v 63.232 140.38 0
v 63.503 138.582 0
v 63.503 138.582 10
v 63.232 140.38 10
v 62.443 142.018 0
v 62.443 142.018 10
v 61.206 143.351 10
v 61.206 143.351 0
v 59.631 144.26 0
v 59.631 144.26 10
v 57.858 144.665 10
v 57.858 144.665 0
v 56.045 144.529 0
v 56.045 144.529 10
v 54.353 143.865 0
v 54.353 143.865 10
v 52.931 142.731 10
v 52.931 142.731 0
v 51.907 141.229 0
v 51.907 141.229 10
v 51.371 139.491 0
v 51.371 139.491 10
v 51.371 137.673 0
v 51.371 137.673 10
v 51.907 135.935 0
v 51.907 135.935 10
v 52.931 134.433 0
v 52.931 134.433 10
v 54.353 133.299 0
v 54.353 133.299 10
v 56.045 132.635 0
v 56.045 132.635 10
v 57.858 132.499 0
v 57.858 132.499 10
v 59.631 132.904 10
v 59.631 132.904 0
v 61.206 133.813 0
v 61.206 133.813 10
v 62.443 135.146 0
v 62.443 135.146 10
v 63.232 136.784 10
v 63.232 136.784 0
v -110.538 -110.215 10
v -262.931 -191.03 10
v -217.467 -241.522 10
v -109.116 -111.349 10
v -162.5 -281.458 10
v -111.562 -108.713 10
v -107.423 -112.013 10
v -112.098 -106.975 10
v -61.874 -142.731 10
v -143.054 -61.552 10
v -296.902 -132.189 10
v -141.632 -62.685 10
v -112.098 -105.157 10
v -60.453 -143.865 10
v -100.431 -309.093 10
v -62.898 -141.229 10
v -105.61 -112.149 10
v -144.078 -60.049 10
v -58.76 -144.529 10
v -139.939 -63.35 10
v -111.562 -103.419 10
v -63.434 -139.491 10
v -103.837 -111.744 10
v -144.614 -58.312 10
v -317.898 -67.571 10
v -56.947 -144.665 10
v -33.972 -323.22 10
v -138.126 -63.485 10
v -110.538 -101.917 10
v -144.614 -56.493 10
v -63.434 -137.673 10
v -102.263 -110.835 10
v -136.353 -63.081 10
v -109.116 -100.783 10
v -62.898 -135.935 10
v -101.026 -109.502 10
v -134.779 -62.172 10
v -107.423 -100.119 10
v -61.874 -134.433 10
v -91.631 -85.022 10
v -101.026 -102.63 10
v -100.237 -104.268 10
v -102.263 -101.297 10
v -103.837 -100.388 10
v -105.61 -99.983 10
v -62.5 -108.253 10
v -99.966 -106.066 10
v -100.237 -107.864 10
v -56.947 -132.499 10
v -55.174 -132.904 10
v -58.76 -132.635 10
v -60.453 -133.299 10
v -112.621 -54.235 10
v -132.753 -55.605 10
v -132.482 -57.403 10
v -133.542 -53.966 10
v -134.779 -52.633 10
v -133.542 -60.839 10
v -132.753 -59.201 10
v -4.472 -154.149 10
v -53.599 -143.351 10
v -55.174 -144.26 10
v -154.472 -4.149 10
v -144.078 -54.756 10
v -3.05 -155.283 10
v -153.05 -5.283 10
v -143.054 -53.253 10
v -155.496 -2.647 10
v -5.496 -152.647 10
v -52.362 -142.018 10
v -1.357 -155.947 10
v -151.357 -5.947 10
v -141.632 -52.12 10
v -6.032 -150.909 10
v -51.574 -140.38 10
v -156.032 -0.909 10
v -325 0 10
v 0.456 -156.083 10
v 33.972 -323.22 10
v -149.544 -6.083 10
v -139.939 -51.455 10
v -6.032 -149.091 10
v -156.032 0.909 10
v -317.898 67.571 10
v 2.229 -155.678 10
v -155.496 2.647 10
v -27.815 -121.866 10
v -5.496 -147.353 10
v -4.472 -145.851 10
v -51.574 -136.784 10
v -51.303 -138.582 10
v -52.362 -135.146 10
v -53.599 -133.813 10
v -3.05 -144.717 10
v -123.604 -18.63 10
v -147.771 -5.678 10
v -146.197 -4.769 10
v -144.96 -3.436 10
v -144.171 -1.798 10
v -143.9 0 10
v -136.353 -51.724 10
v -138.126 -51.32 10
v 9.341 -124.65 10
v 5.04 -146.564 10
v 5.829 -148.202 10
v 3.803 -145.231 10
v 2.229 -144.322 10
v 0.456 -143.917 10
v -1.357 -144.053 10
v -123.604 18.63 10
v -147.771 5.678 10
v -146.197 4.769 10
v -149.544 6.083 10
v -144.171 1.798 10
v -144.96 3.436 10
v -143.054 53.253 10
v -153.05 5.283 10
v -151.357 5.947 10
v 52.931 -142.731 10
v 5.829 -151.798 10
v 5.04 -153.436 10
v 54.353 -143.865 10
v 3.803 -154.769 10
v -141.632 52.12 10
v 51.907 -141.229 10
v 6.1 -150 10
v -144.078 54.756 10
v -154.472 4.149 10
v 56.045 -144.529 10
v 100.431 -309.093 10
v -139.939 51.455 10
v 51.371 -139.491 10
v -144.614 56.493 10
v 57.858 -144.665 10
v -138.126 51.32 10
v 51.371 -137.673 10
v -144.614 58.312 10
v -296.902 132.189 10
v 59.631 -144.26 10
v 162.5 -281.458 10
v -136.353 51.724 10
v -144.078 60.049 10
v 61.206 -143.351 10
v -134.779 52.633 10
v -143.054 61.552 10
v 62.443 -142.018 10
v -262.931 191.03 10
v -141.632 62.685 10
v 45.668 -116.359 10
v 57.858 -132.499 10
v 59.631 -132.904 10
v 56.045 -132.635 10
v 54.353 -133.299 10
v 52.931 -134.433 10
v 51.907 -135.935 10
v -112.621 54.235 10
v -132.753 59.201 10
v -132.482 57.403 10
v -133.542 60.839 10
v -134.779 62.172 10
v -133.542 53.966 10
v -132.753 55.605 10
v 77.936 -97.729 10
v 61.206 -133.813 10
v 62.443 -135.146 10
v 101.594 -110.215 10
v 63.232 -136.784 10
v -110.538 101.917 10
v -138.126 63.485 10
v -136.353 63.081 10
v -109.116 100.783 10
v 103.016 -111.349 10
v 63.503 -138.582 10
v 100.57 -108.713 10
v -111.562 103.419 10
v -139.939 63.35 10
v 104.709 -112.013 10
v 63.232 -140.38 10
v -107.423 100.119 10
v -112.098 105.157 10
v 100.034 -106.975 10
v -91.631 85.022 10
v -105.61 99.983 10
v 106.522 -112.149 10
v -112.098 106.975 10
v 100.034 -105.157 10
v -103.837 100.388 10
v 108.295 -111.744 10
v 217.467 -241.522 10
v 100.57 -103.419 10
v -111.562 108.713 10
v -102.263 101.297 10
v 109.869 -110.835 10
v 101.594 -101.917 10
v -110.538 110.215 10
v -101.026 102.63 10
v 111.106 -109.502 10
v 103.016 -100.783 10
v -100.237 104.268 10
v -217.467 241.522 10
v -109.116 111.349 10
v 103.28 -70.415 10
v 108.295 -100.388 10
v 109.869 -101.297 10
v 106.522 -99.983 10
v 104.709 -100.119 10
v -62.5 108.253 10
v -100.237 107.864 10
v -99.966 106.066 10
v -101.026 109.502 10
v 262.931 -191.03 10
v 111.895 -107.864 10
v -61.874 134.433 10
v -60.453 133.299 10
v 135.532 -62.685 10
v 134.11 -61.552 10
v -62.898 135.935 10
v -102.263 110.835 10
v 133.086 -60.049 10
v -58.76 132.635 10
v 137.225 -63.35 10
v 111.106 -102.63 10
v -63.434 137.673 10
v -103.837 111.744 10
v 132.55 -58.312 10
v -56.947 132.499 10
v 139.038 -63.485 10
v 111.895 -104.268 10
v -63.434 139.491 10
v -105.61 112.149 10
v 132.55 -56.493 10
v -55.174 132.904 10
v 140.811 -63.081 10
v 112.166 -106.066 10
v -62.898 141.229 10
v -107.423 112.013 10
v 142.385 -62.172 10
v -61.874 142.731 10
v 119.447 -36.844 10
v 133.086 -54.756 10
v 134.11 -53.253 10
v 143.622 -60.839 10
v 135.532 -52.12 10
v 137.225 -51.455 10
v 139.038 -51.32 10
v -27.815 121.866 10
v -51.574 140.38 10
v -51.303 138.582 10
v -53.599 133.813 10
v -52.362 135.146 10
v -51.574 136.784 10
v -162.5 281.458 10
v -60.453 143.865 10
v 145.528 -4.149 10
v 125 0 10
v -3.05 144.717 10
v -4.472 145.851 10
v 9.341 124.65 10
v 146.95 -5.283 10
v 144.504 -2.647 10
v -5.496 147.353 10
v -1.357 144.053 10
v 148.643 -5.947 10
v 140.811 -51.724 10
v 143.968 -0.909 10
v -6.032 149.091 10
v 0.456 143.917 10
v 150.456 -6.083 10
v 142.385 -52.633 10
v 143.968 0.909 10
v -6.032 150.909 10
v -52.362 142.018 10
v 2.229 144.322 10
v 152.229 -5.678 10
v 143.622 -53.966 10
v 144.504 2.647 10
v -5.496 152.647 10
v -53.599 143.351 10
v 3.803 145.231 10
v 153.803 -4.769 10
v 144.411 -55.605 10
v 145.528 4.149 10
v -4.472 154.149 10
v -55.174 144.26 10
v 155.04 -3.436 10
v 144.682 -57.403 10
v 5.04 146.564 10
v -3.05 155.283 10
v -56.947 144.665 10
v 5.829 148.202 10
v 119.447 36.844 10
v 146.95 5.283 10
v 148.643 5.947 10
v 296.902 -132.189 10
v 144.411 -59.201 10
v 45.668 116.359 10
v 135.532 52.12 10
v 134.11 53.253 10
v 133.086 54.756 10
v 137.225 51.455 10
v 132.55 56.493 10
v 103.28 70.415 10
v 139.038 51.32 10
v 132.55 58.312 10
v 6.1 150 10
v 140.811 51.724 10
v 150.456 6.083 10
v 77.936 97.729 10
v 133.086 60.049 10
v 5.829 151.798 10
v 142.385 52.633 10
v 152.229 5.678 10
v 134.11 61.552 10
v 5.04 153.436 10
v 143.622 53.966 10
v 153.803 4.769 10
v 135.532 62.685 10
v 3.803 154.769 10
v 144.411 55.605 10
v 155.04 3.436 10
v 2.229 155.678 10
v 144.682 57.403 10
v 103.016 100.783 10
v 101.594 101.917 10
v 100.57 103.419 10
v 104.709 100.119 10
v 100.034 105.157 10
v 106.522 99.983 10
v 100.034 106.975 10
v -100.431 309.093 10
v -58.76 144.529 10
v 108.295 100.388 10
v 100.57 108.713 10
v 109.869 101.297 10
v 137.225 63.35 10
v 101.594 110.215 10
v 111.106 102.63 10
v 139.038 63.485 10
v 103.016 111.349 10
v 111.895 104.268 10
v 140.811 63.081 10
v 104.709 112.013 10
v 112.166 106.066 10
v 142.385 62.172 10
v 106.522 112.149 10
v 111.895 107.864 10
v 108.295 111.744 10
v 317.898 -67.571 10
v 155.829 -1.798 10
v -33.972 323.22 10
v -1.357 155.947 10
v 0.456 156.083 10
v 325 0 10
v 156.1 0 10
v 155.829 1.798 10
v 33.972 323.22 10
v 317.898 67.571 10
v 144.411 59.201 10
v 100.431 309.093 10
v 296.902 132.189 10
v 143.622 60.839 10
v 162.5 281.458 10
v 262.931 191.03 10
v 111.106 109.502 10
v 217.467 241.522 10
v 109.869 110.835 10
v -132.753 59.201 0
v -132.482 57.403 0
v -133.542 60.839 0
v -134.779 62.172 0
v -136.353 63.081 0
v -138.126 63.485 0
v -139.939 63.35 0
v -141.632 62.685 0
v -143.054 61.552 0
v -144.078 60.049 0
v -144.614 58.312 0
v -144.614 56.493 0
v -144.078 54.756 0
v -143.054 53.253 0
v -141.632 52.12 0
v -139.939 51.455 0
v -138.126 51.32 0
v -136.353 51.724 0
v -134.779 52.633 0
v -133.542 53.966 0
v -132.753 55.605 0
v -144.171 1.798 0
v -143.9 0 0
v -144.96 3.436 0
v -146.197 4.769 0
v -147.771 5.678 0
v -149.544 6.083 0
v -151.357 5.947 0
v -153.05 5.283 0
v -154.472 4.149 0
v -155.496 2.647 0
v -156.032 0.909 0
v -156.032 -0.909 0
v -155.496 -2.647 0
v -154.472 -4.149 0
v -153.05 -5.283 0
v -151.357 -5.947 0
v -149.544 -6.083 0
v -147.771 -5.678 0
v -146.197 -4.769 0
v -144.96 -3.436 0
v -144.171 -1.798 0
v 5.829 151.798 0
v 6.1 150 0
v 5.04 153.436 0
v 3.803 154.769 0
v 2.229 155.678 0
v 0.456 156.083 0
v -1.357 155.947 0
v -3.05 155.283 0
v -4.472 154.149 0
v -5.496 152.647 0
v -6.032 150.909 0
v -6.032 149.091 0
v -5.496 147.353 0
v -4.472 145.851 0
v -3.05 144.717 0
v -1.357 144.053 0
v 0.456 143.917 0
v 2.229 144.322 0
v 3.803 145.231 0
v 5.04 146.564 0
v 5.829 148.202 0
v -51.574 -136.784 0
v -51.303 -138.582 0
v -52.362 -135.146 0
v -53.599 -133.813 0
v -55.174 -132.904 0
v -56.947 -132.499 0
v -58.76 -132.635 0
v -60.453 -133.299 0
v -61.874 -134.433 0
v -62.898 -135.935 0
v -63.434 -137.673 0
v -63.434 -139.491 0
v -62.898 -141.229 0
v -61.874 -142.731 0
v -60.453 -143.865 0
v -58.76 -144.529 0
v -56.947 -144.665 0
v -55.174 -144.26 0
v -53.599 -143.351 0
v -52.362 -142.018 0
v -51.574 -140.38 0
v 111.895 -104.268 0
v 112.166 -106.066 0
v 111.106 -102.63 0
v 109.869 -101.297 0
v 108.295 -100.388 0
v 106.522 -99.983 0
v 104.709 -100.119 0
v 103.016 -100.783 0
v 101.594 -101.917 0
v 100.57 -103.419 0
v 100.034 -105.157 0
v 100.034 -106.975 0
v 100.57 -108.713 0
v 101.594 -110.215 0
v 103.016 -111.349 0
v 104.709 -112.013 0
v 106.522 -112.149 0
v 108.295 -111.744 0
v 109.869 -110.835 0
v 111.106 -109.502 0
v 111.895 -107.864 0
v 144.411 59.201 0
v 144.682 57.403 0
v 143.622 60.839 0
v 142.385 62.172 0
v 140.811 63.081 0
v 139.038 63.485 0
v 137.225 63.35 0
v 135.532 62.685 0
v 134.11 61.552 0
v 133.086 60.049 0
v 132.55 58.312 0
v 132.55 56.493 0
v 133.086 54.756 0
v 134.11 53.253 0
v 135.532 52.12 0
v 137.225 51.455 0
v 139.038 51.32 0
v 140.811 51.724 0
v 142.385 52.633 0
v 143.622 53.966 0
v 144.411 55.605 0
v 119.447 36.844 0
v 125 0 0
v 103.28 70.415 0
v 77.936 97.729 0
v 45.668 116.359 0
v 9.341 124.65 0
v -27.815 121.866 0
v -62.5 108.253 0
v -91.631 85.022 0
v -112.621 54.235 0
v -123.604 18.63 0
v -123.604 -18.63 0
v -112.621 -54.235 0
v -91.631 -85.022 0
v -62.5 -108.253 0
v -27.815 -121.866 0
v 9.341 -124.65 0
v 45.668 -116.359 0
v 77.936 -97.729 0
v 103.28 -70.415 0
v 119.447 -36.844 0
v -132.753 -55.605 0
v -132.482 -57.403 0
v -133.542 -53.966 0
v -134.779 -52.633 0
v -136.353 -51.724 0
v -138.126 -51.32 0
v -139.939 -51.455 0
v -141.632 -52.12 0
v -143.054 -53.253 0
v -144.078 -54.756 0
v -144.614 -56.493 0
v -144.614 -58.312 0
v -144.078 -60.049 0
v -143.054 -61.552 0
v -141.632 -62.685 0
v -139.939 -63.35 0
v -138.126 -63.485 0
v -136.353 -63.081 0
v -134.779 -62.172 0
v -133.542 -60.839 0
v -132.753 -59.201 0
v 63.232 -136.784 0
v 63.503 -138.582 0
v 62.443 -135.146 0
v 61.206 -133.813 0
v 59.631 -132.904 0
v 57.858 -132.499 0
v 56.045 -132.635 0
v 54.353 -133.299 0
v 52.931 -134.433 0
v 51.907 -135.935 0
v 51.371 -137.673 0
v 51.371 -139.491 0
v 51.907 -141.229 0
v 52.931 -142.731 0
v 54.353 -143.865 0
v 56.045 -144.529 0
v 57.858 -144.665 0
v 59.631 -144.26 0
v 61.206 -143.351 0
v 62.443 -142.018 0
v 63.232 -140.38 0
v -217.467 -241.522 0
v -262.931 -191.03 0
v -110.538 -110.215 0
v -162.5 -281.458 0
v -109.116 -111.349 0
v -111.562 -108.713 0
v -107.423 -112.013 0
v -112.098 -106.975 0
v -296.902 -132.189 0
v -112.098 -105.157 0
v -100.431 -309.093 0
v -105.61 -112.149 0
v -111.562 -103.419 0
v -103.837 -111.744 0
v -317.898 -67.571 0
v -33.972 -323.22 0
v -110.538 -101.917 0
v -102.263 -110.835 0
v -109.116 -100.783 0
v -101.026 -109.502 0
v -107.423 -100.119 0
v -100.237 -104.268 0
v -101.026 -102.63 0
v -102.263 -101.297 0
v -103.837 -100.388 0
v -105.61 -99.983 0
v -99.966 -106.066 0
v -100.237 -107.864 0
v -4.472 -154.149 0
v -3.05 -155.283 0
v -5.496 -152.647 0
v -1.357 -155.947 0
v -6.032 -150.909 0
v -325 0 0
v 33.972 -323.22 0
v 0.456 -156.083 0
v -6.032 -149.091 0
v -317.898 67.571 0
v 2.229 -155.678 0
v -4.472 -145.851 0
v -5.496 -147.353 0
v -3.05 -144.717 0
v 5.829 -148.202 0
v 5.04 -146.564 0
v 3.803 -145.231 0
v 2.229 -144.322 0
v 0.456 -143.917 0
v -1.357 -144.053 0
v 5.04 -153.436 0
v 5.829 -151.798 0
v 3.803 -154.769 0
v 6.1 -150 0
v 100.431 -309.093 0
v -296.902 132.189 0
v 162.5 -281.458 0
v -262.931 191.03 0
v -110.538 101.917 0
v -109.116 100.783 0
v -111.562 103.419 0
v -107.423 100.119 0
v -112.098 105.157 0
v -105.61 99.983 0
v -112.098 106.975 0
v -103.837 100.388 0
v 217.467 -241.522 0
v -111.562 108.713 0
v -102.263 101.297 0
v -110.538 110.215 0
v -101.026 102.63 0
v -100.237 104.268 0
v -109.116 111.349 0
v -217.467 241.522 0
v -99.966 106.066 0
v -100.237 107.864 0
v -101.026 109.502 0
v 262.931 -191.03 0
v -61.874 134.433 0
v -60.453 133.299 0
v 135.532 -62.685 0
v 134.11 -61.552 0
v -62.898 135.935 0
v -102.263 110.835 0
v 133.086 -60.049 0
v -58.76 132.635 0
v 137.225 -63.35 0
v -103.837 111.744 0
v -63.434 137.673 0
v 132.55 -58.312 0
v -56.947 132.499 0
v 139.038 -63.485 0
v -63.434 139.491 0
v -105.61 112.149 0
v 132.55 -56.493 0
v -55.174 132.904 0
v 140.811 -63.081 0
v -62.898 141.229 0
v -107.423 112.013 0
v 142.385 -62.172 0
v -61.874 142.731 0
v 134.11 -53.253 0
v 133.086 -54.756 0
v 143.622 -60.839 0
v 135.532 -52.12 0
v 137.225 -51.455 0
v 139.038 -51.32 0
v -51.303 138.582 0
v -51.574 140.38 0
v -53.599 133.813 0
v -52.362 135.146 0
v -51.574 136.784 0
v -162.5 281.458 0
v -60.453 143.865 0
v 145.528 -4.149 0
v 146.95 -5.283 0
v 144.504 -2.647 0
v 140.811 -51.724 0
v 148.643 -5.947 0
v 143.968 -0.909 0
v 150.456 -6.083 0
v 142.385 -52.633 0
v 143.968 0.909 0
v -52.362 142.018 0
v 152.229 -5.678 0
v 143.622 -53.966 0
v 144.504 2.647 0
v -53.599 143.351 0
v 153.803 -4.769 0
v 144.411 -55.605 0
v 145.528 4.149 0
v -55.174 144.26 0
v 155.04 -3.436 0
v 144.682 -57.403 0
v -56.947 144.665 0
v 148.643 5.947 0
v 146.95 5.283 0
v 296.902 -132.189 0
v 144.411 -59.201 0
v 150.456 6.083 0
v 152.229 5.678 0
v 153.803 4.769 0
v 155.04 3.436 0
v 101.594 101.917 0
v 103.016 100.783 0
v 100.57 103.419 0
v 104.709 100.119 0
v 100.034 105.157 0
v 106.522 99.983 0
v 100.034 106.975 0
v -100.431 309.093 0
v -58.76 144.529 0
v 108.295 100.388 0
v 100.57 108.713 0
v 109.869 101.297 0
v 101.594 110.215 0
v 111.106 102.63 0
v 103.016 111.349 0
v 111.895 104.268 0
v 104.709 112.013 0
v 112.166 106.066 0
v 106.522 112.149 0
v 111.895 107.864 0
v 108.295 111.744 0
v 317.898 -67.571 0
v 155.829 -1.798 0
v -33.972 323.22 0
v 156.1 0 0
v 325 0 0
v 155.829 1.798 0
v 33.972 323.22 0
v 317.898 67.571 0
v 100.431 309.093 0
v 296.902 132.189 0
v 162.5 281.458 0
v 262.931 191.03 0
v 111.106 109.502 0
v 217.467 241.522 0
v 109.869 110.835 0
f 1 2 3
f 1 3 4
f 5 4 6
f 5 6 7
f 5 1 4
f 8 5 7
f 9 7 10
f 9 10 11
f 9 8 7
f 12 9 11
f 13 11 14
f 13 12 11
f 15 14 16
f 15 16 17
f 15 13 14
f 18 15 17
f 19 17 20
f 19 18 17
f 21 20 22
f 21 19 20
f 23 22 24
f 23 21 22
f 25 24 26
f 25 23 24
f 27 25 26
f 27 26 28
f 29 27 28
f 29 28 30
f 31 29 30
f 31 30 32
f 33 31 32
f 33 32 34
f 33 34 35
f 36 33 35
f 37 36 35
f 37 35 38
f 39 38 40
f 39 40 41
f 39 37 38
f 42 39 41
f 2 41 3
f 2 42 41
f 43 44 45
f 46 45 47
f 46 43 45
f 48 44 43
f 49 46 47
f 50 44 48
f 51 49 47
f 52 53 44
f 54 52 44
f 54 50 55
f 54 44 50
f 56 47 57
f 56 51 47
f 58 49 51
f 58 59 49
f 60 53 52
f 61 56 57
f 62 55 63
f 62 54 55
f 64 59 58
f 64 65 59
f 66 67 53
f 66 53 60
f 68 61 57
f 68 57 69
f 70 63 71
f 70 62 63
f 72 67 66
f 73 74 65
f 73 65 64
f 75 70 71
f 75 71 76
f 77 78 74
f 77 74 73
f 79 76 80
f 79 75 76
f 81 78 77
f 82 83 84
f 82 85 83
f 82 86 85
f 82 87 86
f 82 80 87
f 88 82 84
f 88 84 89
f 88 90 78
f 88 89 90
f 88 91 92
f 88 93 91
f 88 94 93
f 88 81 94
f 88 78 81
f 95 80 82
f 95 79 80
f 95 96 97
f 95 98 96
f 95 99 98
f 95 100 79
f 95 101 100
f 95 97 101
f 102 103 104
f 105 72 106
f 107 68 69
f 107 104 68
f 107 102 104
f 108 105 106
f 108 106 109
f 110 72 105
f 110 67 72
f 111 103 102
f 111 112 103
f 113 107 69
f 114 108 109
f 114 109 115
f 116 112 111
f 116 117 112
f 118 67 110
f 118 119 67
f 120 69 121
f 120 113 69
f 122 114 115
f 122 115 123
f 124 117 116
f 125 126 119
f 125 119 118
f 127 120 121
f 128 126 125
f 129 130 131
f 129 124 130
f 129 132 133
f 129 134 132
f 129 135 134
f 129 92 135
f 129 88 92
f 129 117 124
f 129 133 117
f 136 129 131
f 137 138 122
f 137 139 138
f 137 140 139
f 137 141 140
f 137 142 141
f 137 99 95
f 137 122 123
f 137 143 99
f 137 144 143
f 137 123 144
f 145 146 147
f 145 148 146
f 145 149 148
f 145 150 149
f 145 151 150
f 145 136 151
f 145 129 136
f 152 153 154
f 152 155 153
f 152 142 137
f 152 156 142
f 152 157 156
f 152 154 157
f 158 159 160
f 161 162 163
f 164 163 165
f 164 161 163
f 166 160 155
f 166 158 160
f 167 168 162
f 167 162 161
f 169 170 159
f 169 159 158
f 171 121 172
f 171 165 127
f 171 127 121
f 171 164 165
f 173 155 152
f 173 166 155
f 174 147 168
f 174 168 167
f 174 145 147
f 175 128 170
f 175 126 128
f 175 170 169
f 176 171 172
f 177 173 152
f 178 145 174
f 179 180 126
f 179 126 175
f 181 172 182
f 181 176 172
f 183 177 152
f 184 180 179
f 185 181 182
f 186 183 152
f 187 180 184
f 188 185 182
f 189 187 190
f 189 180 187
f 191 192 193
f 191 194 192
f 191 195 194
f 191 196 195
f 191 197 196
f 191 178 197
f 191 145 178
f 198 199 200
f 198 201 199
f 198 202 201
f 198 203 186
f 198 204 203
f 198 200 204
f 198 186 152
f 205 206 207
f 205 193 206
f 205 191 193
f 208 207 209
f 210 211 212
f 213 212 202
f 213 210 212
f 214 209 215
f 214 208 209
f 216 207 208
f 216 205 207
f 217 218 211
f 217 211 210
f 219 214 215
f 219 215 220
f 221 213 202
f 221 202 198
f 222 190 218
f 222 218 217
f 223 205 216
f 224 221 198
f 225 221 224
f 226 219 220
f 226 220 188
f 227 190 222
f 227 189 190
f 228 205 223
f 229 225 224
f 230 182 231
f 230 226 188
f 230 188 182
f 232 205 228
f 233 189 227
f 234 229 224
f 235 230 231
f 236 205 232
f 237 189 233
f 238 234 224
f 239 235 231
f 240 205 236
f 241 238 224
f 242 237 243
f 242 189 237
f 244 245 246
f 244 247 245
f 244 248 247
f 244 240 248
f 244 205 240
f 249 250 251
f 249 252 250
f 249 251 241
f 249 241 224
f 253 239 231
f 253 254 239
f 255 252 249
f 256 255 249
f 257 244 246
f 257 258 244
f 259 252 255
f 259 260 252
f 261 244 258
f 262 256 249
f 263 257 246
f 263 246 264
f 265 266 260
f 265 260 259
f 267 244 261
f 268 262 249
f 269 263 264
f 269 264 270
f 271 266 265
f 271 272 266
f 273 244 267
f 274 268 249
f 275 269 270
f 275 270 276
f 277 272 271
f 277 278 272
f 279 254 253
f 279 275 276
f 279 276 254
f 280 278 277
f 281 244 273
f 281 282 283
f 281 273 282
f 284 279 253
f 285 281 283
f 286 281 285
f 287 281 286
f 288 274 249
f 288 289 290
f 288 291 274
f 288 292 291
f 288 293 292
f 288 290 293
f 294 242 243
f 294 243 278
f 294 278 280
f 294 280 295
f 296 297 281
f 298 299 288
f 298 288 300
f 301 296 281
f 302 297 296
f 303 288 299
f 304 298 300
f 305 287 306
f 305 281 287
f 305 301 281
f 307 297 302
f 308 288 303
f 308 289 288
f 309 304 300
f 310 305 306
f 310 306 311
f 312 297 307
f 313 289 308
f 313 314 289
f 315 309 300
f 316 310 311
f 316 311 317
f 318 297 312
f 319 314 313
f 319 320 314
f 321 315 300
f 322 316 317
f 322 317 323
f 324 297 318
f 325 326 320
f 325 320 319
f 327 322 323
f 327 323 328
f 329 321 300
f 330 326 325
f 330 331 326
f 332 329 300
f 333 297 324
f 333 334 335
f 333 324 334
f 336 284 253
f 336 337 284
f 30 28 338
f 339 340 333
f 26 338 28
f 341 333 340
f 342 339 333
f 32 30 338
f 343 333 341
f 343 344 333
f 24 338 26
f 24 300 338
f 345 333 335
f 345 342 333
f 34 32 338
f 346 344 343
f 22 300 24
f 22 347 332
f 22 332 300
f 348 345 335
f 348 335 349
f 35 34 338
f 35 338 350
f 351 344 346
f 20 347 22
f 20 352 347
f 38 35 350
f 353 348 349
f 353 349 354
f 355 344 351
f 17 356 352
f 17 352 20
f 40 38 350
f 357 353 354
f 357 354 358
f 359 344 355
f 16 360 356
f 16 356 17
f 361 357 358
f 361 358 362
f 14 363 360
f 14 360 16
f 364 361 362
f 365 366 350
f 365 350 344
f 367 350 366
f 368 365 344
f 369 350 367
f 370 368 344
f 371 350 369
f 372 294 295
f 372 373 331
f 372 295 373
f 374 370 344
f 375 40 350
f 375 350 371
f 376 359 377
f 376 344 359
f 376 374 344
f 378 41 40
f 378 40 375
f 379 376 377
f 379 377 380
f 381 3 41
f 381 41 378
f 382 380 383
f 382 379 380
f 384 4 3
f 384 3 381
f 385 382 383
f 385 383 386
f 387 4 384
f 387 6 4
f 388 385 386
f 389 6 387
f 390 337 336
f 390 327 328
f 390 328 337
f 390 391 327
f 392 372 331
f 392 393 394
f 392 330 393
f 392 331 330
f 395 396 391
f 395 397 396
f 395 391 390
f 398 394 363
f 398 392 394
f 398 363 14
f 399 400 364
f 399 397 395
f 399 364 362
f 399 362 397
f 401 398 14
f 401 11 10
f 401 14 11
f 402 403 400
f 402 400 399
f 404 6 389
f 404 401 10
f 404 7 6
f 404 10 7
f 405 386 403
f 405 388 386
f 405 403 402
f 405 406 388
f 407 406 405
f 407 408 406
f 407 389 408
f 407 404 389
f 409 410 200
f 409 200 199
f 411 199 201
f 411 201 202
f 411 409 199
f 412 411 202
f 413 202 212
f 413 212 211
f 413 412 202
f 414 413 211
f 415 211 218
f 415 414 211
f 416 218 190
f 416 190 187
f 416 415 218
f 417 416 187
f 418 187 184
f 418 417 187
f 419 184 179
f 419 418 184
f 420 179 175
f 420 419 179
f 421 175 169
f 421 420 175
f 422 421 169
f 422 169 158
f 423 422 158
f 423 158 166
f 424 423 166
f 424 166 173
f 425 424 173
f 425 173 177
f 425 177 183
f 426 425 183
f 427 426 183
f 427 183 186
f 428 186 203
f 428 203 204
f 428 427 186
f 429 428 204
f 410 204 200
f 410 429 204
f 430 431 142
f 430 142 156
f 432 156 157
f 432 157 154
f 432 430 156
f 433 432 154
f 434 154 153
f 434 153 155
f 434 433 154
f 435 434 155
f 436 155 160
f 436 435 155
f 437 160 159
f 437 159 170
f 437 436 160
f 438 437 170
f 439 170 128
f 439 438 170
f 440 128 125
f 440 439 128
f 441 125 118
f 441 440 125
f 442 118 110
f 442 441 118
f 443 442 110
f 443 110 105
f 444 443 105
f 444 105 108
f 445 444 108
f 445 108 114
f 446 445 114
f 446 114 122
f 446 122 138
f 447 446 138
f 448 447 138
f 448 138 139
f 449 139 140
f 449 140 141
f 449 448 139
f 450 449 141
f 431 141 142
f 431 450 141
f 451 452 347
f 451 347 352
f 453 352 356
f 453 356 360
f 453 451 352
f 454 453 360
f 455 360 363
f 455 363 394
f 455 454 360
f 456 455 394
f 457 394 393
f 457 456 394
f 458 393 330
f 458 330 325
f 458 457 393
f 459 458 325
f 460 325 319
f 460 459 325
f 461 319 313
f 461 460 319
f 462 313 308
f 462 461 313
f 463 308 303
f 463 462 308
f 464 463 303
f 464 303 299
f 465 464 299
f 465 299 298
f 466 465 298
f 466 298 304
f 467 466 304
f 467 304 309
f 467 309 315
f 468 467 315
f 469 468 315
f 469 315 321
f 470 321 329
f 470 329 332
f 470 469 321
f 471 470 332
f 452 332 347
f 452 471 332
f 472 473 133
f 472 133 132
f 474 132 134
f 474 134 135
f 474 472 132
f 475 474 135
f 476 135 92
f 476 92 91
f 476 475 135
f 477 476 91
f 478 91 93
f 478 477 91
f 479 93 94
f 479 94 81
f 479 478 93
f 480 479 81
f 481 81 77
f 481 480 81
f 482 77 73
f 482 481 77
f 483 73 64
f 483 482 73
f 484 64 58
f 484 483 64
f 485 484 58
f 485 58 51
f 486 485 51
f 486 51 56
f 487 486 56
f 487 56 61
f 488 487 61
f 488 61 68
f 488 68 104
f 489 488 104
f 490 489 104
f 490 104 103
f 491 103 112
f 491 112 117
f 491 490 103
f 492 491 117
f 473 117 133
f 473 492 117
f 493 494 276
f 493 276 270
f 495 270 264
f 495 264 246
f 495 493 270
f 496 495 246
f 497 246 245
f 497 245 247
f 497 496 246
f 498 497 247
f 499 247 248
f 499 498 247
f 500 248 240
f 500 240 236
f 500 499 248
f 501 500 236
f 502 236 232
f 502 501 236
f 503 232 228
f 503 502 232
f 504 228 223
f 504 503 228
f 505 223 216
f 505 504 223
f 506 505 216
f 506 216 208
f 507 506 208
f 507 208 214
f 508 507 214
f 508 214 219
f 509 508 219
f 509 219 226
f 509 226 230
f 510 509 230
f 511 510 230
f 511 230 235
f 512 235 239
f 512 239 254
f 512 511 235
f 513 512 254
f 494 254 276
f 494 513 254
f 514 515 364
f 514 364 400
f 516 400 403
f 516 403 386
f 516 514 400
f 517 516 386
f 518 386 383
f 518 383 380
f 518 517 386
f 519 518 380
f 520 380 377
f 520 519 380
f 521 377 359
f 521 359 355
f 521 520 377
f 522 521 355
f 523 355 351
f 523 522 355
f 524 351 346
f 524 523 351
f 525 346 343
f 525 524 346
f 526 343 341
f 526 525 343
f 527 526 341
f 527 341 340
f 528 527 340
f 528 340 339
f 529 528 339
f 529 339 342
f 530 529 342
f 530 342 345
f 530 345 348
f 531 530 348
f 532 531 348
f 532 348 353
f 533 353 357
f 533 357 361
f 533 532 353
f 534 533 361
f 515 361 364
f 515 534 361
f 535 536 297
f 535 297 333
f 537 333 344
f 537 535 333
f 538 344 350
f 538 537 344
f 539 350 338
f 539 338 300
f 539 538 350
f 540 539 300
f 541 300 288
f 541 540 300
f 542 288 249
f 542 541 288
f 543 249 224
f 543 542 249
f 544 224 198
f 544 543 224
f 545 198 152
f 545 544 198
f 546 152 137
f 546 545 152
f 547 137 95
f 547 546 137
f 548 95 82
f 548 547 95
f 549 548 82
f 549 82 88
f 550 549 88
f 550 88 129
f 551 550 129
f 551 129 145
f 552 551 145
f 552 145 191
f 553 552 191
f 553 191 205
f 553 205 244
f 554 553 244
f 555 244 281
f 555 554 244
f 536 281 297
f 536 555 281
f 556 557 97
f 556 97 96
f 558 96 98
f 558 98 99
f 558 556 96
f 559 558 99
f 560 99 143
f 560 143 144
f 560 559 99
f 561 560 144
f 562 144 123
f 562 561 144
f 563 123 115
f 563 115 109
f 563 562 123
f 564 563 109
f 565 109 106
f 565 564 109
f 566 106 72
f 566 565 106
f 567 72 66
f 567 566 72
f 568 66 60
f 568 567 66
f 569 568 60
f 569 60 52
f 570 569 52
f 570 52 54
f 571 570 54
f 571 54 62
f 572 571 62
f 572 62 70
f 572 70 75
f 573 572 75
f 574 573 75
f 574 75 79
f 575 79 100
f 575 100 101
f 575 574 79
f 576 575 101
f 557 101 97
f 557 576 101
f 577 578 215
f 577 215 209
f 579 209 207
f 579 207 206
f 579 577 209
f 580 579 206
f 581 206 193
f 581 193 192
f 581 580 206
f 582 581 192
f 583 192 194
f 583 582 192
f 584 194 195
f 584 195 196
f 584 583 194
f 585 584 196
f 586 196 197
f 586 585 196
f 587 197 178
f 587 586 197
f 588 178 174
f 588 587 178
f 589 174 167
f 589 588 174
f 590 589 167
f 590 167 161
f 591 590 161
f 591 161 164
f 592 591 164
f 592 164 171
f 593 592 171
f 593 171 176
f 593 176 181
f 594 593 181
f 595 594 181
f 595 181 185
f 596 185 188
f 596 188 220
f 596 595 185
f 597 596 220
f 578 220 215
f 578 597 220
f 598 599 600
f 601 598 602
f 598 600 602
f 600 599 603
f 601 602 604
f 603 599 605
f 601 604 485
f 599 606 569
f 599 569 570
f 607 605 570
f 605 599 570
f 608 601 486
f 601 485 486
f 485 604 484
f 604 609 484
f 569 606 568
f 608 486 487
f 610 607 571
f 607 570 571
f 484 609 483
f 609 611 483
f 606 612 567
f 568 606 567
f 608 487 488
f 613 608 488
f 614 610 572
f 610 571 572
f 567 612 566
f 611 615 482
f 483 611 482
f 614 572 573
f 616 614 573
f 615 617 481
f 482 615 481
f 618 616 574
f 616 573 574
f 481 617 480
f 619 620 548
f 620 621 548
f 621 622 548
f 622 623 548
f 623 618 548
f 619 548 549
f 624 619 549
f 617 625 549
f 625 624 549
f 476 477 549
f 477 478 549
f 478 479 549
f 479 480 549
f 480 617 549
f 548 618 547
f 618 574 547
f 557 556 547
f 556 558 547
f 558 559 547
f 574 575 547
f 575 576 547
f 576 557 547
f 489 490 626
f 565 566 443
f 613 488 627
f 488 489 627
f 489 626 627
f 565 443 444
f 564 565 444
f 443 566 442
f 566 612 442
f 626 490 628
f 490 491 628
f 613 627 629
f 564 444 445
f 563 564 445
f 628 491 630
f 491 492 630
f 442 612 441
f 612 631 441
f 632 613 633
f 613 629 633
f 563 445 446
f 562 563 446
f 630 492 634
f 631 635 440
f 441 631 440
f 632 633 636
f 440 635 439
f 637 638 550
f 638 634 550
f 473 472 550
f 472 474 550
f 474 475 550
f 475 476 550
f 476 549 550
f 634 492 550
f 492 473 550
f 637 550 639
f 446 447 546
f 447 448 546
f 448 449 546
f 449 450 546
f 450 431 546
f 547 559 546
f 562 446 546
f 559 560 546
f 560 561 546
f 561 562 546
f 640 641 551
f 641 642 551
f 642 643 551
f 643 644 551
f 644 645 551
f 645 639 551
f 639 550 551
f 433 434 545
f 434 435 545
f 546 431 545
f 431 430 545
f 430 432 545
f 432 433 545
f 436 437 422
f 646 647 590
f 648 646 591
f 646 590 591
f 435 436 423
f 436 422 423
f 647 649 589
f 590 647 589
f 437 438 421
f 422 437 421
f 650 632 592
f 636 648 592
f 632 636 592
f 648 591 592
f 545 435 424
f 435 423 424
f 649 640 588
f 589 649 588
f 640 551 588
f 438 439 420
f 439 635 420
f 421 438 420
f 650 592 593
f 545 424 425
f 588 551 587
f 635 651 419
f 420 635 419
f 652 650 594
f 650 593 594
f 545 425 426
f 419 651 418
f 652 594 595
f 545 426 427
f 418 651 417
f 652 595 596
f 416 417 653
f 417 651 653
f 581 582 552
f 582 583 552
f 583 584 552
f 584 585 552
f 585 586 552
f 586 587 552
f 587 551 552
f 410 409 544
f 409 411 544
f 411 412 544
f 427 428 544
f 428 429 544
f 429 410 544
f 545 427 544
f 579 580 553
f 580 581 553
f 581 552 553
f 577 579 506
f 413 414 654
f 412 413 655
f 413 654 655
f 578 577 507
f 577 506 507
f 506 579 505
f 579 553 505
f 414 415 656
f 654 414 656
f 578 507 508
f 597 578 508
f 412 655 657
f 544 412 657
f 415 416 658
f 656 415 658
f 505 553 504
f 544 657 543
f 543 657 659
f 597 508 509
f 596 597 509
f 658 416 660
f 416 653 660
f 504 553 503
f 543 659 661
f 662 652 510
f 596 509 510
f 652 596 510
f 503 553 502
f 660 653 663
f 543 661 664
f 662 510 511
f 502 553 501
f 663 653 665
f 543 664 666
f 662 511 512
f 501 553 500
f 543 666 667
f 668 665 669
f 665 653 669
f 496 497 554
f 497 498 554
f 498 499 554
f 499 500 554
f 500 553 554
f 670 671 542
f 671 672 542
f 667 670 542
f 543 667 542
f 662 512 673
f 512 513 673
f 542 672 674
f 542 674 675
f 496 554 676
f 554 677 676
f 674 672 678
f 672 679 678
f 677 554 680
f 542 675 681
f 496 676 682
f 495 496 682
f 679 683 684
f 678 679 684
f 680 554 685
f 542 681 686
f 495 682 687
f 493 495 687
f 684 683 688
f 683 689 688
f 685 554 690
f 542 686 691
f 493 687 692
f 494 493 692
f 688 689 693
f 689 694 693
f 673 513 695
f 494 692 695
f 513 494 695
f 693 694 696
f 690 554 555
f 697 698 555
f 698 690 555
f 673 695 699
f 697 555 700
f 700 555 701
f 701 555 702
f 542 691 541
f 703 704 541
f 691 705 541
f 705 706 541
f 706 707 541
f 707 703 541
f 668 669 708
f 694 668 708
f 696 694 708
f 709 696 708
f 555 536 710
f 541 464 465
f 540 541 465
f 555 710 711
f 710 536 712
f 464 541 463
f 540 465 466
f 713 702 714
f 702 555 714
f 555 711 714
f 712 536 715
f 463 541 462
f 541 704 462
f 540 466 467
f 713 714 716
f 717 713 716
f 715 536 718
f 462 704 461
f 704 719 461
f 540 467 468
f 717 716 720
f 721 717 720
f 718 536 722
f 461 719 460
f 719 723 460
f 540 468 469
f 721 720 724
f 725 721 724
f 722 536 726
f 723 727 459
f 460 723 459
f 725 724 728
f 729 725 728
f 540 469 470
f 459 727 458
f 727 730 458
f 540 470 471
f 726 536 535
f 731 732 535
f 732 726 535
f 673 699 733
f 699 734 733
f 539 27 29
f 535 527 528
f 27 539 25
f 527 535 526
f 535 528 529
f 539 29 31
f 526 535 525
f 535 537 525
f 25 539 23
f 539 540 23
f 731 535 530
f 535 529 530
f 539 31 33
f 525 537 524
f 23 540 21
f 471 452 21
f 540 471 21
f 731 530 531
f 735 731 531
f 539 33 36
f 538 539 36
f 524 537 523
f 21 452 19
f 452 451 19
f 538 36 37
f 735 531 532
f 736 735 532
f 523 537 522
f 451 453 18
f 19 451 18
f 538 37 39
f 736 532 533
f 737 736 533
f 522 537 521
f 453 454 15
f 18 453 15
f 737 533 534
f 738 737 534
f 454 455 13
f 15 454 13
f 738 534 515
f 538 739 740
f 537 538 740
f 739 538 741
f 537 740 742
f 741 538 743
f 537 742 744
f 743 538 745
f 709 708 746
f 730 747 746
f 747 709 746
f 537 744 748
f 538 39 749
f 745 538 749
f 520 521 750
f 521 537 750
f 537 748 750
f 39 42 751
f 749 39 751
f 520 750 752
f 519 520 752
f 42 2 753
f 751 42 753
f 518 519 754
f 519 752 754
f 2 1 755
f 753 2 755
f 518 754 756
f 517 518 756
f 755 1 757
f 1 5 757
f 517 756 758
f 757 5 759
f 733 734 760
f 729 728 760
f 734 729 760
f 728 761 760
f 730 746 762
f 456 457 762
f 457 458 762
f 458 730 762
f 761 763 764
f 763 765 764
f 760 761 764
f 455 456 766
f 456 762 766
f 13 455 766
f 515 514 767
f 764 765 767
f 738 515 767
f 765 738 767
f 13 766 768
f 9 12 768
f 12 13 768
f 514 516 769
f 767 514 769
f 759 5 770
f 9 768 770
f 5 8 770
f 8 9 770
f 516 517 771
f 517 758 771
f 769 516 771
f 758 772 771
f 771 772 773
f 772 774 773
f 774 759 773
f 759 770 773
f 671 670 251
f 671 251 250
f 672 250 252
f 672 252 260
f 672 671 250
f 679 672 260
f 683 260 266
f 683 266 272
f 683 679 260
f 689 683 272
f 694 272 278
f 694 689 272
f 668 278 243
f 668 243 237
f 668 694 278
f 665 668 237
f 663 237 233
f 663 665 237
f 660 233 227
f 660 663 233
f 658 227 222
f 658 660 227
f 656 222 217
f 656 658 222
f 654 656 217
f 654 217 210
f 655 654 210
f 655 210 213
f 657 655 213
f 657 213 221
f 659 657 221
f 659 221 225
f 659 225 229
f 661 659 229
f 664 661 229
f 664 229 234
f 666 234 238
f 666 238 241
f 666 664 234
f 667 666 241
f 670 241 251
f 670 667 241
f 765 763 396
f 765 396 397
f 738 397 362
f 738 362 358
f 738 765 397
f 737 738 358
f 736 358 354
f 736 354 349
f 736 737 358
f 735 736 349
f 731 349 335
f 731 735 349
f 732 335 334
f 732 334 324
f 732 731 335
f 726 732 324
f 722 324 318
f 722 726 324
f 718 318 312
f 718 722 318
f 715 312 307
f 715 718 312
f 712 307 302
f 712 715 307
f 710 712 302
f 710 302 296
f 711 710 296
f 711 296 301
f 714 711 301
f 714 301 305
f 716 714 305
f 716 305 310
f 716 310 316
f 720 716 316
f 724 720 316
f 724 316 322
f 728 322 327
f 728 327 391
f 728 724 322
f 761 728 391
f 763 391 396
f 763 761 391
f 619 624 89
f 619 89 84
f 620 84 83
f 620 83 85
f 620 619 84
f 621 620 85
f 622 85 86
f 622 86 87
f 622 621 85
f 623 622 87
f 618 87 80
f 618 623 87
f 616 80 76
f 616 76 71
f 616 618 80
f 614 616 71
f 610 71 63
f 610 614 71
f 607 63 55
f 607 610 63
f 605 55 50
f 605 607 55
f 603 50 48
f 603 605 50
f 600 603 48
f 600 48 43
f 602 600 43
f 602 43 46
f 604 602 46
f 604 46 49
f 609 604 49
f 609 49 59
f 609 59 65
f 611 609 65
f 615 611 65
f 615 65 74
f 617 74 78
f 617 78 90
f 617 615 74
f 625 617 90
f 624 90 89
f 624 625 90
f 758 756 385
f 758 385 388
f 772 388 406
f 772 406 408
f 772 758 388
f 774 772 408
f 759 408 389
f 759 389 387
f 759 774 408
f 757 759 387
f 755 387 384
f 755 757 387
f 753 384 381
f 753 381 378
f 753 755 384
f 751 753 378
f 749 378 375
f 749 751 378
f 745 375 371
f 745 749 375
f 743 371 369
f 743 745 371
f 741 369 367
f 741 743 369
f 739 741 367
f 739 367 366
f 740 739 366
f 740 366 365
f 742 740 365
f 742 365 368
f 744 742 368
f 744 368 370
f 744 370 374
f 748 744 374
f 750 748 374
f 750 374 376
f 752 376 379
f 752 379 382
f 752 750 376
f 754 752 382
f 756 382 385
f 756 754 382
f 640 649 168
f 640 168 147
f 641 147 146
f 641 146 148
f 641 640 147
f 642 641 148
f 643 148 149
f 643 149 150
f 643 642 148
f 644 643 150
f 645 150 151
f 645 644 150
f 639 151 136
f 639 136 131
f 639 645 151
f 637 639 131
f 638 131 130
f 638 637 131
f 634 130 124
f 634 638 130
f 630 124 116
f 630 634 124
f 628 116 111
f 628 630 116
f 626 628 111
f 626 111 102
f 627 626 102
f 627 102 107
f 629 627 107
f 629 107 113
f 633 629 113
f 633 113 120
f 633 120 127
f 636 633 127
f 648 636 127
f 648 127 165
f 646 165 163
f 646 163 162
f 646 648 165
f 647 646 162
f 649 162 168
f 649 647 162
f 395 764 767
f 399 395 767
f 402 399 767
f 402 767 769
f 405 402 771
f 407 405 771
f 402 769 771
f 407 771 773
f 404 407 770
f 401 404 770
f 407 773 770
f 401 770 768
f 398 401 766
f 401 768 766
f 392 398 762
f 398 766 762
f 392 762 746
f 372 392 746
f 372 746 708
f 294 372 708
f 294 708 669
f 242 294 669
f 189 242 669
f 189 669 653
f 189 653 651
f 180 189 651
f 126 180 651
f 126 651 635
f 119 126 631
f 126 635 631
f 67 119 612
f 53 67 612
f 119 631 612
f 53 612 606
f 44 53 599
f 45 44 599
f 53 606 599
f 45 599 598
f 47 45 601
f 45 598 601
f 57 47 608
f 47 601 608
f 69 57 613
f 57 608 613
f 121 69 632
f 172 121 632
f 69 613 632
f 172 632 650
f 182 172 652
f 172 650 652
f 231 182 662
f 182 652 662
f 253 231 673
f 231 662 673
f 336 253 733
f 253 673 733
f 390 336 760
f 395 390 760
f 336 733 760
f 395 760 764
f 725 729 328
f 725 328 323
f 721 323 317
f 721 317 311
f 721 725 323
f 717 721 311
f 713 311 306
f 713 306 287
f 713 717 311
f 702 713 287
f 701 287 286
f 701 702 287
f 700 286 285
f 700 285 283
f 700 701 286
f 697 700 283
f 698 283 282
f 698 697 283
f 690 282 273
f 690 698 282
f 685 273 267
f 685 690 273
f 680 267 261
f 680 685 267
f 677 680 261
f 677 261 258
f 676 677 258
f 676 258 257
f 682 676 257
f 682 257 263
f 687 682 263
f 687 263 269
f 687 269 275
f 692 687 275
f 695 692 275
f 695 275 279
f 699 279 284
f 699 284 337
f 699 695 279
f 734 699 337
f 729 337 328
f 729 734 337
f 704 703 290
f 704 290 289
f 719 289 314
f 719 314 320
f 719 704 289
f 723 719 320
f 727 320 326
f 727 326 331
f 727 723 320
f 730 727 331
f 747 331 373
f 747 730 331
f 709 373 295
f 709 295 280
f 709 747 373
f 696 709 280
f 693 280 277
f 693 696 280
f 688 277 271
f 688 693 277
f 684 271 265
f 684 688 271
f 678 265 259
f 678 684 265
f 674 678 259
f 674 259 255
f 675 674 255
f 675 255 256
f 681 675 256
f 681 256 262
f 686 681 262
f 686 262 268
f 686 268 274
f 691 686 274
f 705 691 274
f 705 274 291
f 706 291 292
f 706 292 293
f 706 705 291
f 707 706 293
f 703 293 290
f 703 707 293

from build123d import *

# Parameters (mm, degrees)
SKETCH1_R           = 325
SKETCH1_R_2         = 125
SKETCH1_R_3         = 6.1
BOSS_EXTRUDE1_DEPTH = 10


with BuildPart() as part:
    # Sketch1 → Boss-Extrude1 (new body)
    with BuildSketch(Plane.XY):
        Circle(SKETCH1_R)
        Circle(SKETCH1_R_2, mode=Mode.SUBTRACT)
        with Locations((0, 150)):
            Circle(SKETCH1_R_3, mode=Mode.SUBTRACT)
        with Locations((57.402514855, 138.581929877)):
            Circle(SKETCH1_R_3, mode=Mode.SUBTRACT)
        with Locations((106.066017178, 106.066017178)):
            Circle(SKETCH1_R_3, mode=Mode.SUBTRACT)
        with Locations((138.581929877, 57.402514855)):
            Circle(SKETCH1_R_3, mode=Mode.SUBTRACT)
        with Locations((150, 0)):
            Circle(SKETCH1_R_3, mode=Mode.SUBTRACT)
        with Locations((138.581929877, -57.402514855)):
            Circle(SKETCH1_R_3, mode=Mode.SUBTRACT)
        with Locations((106.066017178, -106.066017178)):
            Circle(SKETCH1_R_3, mode=Mode.SUBTRACT)
        with Locations((57.402514855, -138.581929877)):
            Circle(SKETCH1_R_3, mode=Mode.SUBTRACT)
        with Locations((0, -150)):
            Circle(SKETCH1_R_3, mode=Mode.SUBTRACT)
        with Locations((-57.402514855, -138.581929877)):
            Circle(SKETCH1_R_3, mode=Mode.SUBTRACT)
        with Locations((-106.066017178, -106.066017178)):
            Circle(SKETCH1_R_3, mode=Mode.SUBTRACT)
        with Locations((-138.581929877, -57.402514855)):
            Circle(SKETCH1_R_3, mode=Mode.SUBTRACT)
        with Locations((-150, 0)):
            Circle(SKETCH1_R_3, mode=Mode.SUBTRACT)
        with Locations((-138.581929877, 57.402514855)):
            Circle(SKETCH1_R_3, mode=Mode.SUBTRACT)
        with Locations((-106.066017178, 106.066017178)):
            Circle(SKETCH1_R_3, mode=Mode.SUBTRACT)
        with Locations((-57.402514855, 138.581929877)):
            Circle(SKETCH1_R_3, mode=Mode.SUBTRACT)
    extrude(amount=BOSS_EXTRUDE1_DEPTH)


solid = part.part
